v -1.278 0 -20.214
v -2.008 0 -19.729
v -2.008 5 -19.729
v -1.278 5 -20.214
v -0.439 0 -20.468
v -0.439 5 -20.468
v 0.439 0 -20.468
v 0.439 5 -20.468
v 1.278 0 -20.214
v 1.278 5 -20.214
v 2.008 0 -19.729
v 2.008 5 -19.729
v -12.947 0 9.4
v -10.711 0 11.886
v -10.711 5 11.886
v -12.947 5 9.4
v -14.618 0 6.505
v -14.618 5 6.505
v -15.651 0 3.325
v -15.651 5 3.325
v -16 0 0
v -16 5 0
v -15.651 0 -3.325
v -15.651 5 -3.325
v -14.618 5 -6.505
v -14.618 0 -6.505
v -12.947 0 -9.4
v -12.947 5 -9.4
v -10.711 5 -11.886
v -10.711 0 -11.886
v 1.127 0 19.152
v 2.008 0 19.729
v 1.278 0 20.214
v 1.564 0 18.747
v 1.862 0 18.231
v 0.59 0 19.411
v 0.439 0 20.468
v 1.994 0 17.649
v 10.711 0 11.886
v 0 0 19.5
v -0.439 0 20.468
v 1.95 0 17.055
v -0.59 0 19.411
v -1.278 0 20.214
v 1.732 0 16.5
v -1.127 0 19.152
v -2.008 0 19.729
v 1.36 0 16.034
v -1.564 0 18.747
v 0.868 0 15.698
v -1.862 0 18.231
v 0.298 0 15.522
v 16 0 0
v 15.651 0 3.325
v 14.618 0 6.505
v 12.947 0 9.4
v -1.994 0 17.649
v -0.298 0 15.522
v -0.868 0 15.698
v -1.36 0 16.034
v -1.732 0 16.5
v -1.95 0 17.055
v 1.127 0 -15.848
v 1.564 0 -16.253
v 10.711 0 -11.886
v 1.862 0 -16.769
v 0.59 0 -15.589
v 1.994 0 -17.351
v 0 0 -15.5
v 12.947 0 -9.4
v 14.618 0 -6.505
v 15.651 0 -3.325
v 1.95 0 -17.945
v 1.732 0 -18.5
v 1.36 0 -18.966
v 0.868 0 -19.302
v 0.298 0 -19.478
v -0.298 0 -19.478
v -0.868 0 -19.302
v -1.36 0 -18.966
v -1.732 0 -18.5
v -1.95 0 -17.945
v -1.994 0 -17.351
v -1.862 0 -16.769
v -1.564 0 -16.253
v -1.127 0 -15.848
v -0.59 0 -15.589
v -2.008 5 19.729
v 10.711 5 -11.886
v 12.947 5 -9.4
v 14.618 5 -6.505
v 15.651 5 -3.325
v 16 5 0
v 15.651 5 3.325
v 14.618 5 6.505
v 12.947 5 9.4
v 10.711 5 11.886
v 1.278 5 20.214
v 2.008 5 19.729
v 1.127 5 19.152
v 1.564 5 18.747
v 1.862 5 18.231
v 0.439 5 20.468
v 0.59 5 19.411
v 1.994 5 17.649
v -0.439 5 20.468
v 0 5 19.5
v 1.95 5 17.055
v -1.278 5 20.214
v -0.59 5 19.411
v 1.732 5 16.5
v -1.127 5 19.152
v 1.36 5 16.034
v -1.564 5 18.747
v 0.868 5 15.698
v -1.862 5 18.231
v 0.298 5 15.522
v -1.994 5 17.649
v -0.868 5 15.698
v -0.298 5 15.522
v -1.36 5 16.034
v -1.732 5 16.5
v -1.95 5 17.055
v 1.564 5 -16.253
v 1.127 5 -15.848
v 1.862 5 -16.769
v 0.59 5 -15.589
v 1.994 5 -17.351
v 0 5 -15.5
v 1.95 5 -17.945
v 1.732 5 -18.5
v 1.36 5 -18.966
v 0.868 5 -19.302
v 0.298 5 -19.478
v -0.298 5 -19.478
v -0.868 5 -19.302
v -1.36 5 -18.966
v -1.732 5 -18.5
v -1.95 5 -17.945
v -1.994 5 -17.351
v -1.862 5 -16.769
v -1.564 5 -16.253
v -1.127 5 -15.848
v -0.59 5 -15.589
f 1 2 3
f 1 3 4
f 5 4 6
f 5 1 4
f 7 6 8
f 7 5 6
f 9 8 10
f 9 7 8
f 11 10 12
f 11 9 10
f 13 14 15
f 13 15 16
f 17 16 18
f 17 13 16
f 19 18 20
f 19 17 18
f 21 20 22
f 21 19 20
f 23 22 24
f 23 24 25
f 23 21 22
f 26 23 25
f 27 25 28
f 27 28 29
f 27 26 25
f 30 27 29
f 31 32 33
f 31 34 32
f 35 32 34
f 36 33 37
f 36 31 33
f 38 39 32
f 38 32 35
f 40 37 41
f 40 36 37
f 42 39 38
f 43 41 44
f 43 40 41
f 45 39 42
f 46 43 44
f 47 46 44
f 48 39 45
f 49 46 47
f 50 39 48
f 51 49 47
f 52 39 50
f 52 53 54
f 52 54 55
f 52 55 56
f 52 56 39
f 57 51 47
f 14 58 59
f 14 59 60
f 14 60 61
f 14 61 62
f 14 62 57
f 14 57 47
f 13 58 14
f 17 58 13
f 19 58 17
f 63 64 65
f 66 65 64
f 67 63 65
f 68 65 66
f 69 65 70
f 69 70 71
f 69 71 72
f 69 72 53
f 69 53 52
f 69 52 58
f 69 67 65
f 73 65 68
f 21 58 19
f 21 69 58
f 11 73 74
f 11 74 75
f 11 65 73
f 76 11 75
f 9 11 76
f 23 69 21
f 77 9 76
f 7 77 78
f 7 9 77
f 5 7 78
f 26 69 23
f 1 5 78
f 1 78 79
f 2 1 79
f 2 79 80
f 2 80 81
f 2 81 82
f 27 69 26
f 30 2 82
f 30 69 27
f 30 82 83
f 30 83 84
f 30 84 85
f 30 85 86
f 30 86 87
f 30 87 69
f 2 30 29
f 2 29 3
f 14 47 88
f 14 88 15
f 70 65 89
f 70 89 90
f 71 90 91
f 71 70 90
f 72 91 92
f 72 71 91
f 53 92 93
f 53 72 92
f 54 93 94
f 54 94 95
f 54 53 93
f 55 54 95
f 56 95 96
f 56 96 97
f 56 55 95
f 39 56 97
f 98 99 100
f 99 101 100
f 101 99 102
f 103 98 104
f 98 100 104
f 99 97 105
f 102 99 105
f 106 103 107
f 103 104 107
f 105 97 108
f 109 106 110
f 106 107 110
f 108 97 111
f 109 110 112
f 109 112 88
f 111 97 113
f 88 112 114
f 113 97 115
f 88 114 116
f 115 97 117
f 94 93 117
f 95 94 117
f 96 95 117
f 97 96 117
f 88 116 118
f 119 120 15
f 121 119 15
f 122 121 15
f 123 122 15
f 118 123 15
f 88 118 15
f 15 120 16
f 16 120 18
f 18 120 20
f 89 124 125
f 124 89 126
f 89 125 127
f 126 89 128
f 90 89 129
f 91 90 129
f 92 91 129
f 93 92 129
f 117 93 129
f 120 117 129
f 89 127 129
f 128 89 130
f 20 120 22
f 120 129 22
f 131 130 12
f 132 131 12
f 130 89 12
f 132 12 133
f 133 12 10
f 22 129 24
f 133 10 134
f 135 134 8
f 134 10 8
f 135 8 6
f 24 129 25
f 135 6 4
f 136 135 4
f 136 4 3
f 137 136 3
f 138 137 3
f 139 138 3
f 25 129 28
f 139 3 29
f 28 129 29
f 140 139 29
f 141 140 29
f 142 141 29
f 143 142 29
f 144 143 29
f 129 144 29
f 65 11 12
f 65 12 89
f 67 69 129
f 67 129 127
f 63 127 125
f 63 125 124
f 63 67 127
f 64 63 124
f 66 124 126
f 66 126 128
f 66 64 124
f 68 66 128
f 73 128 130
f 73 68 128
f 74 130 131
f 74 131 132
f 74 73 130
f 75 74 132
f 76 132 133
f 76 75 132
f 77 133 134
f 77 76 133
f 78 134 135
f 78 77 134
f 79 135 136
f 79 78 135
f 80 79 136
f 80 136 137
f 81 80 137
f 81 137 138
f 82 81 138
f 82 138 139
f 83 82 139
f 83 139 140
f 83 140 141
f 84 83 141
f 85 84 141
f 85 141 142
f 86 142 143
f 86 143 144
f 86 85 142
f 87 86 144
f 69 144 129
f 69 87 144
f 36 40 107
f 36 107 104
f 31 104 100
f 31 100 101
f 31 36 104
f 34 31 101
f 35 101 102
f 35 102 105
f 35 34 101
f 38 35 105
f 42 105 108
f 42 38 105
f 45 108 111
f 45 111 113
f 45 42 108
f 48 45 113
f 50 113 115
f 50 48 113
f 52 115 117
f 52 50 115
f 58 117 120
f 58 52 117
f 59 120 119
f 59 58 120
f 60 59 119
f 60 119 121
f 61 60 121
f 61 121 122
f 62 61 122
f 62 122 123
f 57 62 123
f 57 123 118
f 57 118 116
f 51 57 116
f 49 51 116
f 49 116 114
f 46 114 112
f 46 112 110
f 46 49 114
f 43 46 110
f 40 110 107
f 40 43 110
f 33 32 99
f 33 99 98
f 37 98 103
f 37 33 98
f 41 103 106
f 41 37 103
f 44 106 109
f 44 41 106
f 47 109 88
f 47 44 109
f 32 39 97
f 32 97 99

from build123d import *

# Parameters (mm, degrees)
SKETCH_1_R      = 2
EXTRUDE_1_DEPTH = 5


with BuildPart() as part:
    # 草图1 → 凸台-拉伸1 (new body)
    with BuildSketch(Plane(origin=(0, 0, 0), x_dir=(1, 0, 0), z_dir=(0, 1, 0))):
        with BuildLine():
            ThreePointArc((2.008349917, -19.728571429), (0, -20.5), (-2.008349917, -19.728571429))
            Line((-2.008349917, -19.728571429), (-10.711199556, -11.885714286))
            ThreePointArc((-10.711199556, -11.885714286), (-16, 0), (-10.711199556, 11.885714286))
            Line((-10.711199556, 11.885714286), (-2.008349917, 19.728571429))
            ThreePointArc((-2.008349917, 19.728571429), (0, 20.5), (2.008349917, 19.728571429))
            Line((2.008349917, 19.728571429), (10.711199556, 11.885714286))
            ThreePointArc((10.711199556, 11.885714286), (16, 0), (10.711199556, -11.885714286))
            Line((10.711199556, -11.885714286), (2.008349917, -19.728571429))
        make_face()
        with Locations(Location((0, 17.5, 0), (0, 0, 270))):
            Circle(SKETCH_1_R, mode=Mode.SUBTRACT)
        with Locations(Location((0, -17.5, 0), (0, 0, 270))):
            Circle(SKETCH_1_R, mode=Mode.SUBTRACT)
    extrude(amount=EXTRUDE_1_DEPTH)


solid = part.part
